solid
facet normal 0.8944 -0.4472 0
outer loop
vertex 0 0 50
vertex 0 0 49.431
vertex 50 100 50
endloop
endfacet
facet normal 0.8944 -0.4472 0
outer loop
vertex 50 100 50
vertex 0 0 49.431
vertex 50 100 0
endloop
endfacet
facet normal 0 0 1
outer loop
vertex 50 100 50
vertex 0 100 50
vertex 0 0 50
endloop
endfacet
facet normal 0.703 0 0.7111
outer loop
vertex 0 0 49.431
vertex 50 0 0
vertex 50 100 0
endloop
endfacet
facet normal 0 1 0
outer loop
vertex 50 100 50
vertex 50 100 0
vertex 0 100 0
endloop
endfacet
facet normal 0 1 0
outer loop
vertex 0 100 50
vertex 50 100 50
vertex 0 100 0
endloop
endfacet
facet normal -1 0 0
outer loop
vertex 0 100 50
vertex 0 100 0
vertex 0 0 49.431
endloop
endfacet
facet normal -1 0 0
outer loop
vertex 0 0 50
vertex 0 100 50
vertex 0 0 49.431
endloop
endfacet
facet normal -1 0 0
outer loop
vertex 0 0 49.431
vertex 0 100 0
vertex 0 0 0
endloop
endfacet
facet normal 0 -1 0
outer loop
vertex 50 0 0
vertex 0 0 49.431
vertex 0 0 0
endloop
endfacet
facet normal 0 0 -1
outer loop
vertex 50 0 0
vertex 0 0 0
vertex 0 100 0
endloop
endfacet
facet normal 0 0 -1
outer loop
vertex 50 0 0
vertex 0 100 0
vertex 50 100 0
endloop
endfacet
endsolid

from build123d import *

# Parameters (mm, degrees)
F1_DEPTH = 50
F3_DEPTH = 100


with BuildPart() as f1:
    # F0 (on Top) → F1 (new body)
    with BuildSketch(Plane.XY):
        Polygon((0, 100), (0, 0), (50, 100), align=None)
    extrude(amount=F1_DEPTH)

    # F2 (on Front) → F3 (join)
    with BuildSketch(Plane.XZ):
        Polygon((50, 0), (0, 49.431257), (0, 0), align=None)
    extrude(amount=-F3_DEPTH)


solid = f1.part
